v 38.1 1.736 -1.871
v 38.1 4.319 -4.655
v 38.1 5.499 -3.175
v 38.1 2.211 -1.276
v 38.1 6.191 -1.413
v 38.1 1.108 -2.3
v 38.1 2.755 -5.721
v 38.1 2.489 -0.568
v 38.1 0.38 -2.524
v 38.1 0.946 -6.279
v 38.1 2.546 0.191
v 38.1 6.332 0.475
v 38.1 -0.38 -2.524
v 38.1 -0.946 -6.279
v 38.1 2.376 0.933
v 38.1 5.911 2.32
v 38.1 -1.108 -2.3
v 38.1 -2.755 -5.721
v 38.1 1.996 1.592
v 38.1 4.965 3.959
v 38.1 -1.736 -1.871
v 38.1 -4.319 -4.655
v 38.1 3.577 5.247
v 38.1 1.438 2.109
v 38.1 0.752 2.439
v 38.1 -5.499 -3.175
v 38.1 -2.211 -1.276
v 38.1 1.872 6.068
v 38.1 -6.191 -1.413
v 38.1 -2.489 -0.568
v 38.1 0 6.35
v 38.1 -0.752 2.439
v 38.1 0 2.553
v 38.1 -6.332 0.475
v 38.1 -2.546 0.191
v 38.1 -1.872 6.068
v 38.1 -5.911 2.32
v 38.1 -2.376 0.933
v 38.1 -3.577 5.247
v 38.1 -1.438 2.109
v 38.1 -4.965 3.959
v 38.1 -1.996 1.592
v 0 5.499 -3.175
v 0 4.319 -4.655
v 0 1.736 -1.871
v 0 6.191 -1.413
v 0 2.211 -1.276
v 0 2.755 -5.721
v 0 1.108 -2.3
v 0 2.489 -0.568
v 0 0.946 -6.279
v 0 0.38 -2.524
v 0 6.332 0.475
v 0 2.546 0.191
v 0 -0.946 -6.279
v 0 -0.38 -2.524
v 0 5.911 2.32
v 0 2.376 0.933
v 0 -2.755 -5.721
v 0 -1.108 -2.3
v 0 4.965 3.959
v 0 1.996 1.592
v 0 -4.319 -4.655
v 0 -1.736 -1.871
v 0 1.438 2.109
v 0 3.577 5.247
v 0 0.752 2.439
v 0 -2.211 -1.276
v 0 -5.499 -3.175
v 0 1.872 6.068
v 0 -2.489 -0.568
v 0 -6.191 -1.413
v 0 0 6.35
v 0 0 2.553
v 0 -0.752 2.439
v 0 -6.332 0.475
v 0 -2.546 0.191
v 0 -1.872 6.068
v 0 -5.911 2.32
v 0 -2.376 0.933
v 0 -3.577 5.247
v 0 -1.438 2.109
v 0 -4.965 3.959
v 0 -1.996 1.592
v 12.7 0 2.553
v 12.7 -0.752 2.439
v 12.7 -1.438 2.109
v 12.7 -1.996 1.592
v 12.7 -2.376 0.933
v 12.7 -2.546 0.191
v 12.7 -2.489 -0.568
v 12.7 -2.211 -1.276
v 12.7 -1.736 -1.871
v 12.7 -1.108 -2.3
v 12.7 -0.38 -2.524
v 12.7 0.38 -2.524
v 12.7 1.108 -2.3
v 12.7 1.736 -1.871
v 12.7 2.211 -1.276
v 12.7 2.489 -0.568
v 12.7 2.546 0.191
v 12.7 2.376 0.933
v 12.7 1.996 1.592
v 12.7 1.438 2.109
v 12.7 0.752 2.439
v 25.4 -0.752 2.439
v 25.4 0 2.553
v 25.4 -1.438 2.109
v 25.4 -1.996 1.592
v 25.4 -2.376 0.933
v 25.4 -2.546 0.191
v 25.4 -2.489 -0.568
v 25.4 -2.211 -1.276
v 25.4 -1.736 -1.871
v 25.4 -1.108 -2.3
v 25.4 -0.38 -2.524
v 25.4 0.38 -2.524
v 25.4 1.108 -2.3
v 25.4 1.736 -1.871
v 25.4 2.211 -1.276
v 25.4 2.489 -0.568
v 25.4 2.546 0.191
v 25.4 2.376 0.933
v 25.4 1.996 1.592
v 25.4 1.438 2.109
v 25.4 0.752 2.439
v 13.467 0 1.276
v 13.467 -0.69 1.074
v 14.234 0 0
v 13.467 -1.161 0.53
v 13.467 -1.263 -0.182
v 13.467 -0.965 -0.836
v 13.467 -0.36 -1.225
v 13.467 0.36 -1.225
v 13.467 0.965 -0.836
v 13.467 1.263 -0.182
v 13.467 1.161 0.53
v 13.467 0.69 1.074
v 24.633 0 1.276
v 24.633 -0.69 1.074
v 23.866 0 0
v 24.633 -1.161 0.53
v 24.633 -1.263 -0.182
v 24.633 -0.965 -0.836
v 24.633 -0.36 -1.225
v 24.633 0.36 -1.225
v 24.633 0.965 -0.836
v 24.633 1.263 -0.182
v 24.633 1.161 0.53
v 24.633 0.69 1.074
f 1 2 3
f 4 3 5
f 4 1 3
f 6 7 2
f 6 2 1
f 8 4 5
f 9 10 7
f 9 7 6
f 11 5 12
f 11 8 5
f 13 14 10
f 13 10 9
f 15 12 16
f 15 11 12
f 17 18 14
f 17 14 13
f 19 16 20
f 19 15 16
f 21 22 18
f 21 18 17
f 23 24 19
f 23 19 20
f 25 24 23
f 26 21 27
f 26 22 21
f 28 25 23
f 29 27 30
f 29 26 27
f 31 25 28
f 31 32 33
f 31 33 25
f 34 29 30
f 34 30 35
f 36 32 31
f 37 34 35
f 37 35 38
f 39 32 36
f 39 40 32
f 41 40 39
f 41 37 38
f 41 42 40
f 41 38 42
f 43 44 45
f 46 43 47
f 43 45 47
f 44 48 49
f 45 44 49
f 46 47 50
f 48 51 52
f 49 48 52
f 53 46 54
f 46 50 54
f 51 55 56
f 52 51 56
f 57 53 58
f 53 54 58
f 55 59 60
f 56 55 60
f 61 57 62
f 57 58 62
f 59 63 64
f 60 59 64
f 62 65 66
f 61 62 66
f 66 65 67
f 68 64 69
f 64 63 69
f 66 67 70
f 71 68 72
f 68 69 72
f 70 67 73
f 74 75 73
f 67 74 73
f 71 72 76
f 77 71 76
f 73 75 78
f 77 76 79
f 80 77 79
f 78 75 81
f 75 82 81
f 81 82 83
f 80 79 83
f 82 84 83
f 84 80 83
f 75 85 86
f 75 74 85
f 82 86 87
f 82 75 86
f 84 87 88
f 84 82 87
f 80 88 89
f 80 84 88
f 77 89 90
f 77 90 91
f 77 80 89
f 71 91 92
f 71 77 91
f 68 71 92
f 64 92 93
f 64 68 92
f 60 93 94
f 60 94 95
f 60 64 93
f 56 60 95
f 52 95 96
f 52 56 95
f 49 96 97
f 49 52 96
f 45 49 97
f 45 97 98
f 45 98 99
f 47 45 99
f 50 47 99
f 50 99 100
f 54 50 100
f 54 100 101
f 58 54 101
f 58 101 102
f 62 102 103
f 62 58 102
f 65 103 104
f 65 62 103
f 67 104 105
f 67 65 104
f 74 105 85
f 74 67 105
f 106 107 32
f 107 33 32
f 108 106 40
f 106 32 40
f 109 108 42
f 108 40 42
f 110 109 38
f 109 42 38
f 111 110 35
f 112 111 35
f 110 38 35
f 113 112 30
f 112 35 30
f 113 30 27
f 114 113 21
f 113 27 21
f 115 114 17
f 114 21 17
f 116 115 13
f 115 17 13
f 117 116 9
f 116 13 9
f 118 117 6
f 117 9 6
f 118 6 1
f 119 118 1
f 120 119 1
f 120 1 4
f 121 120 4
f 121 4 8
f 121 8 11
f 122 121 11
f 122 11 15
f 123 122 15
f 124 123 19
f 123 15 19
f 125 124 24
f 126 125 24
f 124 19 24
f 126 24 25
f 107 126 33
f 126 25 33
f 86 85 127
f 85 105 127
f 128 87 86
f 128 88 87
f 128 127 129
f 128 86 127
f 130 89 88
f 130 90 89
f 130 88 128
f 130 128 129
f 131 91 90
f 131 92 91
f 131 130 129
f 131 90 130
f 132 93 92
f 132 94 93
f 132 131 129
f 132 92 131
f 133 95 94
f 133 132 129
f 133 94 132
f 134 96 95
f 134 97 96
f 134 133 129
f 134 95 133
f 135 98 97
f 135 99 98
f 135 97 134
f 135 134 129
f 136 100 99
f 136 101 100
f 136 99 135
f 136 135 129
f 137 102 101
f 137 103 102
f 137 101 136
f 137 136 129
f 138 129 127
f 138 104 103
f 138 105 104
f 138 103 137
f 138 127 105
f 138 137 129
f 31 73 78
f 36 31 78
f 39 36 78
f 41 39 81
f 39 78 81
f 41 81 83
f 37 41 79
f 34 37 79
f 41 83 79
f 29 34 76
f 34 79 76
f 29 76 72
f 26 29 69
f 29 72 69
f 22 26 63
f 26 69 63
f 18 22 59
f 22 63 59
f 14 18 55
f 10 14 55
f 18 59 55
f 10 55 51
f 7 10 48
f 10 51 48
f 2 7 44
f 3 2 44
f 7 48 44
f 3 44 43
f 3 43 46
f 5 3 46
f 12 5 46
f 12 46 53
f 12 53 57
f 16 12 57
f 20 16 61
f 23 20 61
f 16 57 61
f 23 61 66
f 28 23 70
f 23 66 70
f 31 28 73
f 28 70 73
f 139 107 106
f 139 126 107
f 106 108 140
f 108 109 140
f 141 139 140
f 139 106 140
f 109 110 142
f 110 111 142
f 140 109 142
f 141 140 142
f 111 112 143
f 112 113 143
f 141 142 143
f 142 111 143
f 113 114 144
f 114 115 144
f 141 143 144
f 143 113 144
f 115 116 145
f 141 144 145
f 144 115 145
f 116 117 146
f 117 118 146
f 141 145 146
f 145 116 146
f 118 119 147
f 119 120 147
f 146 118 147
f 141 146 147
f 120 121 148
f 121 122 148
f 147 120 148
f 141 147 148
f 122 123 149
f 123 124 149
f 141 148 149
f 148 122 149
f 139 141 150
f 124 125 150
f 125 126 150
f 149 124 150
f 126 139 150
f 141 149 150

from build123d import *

# Parameters (mm, degrees)
SKETCH1_R           = 6.35
BOSS_EXTRUDE1_DEPTH = 38.1


with BuildPart() as part:
    # Sketch1 → Boss-Extrude1 (new body)
    with BuildSketch(Plane(origin=(0, 0, 0), x_dir=(0, 0, -1), z_dir=(1, 0, 0))):
        with Locations(Location((0, 0, 0), (0, 0, 180))):
            Circle(SKETCH1_R)
    extrude(amount=BOSS_EXTRUDE1_DEPTH)

    # Sketch4 → Tap Drill for 1/4-20 Tap1 (revolve, cut)
    with BuildSketch(Plane.ZX):
        Polygon((0, 0), (0, 14.233816902), (2.5527, 12.7), (2.5527, 0), align=None)
    tap_drill_for_1_4_20_tap1 = revolve(axis=Axis((-6.35, 0, 0), (1, 0, 0)), mode=Mode.SUBTRACT)

    # Mirror1: Tap Drill for 1/4-20 Tap1 across plane
    add(tap_drill_for_1_4_20_tap1.mirror(Plane.ZY.offset(-19.05)), mode=Mode.SUBTRACT)


solid = part.part
